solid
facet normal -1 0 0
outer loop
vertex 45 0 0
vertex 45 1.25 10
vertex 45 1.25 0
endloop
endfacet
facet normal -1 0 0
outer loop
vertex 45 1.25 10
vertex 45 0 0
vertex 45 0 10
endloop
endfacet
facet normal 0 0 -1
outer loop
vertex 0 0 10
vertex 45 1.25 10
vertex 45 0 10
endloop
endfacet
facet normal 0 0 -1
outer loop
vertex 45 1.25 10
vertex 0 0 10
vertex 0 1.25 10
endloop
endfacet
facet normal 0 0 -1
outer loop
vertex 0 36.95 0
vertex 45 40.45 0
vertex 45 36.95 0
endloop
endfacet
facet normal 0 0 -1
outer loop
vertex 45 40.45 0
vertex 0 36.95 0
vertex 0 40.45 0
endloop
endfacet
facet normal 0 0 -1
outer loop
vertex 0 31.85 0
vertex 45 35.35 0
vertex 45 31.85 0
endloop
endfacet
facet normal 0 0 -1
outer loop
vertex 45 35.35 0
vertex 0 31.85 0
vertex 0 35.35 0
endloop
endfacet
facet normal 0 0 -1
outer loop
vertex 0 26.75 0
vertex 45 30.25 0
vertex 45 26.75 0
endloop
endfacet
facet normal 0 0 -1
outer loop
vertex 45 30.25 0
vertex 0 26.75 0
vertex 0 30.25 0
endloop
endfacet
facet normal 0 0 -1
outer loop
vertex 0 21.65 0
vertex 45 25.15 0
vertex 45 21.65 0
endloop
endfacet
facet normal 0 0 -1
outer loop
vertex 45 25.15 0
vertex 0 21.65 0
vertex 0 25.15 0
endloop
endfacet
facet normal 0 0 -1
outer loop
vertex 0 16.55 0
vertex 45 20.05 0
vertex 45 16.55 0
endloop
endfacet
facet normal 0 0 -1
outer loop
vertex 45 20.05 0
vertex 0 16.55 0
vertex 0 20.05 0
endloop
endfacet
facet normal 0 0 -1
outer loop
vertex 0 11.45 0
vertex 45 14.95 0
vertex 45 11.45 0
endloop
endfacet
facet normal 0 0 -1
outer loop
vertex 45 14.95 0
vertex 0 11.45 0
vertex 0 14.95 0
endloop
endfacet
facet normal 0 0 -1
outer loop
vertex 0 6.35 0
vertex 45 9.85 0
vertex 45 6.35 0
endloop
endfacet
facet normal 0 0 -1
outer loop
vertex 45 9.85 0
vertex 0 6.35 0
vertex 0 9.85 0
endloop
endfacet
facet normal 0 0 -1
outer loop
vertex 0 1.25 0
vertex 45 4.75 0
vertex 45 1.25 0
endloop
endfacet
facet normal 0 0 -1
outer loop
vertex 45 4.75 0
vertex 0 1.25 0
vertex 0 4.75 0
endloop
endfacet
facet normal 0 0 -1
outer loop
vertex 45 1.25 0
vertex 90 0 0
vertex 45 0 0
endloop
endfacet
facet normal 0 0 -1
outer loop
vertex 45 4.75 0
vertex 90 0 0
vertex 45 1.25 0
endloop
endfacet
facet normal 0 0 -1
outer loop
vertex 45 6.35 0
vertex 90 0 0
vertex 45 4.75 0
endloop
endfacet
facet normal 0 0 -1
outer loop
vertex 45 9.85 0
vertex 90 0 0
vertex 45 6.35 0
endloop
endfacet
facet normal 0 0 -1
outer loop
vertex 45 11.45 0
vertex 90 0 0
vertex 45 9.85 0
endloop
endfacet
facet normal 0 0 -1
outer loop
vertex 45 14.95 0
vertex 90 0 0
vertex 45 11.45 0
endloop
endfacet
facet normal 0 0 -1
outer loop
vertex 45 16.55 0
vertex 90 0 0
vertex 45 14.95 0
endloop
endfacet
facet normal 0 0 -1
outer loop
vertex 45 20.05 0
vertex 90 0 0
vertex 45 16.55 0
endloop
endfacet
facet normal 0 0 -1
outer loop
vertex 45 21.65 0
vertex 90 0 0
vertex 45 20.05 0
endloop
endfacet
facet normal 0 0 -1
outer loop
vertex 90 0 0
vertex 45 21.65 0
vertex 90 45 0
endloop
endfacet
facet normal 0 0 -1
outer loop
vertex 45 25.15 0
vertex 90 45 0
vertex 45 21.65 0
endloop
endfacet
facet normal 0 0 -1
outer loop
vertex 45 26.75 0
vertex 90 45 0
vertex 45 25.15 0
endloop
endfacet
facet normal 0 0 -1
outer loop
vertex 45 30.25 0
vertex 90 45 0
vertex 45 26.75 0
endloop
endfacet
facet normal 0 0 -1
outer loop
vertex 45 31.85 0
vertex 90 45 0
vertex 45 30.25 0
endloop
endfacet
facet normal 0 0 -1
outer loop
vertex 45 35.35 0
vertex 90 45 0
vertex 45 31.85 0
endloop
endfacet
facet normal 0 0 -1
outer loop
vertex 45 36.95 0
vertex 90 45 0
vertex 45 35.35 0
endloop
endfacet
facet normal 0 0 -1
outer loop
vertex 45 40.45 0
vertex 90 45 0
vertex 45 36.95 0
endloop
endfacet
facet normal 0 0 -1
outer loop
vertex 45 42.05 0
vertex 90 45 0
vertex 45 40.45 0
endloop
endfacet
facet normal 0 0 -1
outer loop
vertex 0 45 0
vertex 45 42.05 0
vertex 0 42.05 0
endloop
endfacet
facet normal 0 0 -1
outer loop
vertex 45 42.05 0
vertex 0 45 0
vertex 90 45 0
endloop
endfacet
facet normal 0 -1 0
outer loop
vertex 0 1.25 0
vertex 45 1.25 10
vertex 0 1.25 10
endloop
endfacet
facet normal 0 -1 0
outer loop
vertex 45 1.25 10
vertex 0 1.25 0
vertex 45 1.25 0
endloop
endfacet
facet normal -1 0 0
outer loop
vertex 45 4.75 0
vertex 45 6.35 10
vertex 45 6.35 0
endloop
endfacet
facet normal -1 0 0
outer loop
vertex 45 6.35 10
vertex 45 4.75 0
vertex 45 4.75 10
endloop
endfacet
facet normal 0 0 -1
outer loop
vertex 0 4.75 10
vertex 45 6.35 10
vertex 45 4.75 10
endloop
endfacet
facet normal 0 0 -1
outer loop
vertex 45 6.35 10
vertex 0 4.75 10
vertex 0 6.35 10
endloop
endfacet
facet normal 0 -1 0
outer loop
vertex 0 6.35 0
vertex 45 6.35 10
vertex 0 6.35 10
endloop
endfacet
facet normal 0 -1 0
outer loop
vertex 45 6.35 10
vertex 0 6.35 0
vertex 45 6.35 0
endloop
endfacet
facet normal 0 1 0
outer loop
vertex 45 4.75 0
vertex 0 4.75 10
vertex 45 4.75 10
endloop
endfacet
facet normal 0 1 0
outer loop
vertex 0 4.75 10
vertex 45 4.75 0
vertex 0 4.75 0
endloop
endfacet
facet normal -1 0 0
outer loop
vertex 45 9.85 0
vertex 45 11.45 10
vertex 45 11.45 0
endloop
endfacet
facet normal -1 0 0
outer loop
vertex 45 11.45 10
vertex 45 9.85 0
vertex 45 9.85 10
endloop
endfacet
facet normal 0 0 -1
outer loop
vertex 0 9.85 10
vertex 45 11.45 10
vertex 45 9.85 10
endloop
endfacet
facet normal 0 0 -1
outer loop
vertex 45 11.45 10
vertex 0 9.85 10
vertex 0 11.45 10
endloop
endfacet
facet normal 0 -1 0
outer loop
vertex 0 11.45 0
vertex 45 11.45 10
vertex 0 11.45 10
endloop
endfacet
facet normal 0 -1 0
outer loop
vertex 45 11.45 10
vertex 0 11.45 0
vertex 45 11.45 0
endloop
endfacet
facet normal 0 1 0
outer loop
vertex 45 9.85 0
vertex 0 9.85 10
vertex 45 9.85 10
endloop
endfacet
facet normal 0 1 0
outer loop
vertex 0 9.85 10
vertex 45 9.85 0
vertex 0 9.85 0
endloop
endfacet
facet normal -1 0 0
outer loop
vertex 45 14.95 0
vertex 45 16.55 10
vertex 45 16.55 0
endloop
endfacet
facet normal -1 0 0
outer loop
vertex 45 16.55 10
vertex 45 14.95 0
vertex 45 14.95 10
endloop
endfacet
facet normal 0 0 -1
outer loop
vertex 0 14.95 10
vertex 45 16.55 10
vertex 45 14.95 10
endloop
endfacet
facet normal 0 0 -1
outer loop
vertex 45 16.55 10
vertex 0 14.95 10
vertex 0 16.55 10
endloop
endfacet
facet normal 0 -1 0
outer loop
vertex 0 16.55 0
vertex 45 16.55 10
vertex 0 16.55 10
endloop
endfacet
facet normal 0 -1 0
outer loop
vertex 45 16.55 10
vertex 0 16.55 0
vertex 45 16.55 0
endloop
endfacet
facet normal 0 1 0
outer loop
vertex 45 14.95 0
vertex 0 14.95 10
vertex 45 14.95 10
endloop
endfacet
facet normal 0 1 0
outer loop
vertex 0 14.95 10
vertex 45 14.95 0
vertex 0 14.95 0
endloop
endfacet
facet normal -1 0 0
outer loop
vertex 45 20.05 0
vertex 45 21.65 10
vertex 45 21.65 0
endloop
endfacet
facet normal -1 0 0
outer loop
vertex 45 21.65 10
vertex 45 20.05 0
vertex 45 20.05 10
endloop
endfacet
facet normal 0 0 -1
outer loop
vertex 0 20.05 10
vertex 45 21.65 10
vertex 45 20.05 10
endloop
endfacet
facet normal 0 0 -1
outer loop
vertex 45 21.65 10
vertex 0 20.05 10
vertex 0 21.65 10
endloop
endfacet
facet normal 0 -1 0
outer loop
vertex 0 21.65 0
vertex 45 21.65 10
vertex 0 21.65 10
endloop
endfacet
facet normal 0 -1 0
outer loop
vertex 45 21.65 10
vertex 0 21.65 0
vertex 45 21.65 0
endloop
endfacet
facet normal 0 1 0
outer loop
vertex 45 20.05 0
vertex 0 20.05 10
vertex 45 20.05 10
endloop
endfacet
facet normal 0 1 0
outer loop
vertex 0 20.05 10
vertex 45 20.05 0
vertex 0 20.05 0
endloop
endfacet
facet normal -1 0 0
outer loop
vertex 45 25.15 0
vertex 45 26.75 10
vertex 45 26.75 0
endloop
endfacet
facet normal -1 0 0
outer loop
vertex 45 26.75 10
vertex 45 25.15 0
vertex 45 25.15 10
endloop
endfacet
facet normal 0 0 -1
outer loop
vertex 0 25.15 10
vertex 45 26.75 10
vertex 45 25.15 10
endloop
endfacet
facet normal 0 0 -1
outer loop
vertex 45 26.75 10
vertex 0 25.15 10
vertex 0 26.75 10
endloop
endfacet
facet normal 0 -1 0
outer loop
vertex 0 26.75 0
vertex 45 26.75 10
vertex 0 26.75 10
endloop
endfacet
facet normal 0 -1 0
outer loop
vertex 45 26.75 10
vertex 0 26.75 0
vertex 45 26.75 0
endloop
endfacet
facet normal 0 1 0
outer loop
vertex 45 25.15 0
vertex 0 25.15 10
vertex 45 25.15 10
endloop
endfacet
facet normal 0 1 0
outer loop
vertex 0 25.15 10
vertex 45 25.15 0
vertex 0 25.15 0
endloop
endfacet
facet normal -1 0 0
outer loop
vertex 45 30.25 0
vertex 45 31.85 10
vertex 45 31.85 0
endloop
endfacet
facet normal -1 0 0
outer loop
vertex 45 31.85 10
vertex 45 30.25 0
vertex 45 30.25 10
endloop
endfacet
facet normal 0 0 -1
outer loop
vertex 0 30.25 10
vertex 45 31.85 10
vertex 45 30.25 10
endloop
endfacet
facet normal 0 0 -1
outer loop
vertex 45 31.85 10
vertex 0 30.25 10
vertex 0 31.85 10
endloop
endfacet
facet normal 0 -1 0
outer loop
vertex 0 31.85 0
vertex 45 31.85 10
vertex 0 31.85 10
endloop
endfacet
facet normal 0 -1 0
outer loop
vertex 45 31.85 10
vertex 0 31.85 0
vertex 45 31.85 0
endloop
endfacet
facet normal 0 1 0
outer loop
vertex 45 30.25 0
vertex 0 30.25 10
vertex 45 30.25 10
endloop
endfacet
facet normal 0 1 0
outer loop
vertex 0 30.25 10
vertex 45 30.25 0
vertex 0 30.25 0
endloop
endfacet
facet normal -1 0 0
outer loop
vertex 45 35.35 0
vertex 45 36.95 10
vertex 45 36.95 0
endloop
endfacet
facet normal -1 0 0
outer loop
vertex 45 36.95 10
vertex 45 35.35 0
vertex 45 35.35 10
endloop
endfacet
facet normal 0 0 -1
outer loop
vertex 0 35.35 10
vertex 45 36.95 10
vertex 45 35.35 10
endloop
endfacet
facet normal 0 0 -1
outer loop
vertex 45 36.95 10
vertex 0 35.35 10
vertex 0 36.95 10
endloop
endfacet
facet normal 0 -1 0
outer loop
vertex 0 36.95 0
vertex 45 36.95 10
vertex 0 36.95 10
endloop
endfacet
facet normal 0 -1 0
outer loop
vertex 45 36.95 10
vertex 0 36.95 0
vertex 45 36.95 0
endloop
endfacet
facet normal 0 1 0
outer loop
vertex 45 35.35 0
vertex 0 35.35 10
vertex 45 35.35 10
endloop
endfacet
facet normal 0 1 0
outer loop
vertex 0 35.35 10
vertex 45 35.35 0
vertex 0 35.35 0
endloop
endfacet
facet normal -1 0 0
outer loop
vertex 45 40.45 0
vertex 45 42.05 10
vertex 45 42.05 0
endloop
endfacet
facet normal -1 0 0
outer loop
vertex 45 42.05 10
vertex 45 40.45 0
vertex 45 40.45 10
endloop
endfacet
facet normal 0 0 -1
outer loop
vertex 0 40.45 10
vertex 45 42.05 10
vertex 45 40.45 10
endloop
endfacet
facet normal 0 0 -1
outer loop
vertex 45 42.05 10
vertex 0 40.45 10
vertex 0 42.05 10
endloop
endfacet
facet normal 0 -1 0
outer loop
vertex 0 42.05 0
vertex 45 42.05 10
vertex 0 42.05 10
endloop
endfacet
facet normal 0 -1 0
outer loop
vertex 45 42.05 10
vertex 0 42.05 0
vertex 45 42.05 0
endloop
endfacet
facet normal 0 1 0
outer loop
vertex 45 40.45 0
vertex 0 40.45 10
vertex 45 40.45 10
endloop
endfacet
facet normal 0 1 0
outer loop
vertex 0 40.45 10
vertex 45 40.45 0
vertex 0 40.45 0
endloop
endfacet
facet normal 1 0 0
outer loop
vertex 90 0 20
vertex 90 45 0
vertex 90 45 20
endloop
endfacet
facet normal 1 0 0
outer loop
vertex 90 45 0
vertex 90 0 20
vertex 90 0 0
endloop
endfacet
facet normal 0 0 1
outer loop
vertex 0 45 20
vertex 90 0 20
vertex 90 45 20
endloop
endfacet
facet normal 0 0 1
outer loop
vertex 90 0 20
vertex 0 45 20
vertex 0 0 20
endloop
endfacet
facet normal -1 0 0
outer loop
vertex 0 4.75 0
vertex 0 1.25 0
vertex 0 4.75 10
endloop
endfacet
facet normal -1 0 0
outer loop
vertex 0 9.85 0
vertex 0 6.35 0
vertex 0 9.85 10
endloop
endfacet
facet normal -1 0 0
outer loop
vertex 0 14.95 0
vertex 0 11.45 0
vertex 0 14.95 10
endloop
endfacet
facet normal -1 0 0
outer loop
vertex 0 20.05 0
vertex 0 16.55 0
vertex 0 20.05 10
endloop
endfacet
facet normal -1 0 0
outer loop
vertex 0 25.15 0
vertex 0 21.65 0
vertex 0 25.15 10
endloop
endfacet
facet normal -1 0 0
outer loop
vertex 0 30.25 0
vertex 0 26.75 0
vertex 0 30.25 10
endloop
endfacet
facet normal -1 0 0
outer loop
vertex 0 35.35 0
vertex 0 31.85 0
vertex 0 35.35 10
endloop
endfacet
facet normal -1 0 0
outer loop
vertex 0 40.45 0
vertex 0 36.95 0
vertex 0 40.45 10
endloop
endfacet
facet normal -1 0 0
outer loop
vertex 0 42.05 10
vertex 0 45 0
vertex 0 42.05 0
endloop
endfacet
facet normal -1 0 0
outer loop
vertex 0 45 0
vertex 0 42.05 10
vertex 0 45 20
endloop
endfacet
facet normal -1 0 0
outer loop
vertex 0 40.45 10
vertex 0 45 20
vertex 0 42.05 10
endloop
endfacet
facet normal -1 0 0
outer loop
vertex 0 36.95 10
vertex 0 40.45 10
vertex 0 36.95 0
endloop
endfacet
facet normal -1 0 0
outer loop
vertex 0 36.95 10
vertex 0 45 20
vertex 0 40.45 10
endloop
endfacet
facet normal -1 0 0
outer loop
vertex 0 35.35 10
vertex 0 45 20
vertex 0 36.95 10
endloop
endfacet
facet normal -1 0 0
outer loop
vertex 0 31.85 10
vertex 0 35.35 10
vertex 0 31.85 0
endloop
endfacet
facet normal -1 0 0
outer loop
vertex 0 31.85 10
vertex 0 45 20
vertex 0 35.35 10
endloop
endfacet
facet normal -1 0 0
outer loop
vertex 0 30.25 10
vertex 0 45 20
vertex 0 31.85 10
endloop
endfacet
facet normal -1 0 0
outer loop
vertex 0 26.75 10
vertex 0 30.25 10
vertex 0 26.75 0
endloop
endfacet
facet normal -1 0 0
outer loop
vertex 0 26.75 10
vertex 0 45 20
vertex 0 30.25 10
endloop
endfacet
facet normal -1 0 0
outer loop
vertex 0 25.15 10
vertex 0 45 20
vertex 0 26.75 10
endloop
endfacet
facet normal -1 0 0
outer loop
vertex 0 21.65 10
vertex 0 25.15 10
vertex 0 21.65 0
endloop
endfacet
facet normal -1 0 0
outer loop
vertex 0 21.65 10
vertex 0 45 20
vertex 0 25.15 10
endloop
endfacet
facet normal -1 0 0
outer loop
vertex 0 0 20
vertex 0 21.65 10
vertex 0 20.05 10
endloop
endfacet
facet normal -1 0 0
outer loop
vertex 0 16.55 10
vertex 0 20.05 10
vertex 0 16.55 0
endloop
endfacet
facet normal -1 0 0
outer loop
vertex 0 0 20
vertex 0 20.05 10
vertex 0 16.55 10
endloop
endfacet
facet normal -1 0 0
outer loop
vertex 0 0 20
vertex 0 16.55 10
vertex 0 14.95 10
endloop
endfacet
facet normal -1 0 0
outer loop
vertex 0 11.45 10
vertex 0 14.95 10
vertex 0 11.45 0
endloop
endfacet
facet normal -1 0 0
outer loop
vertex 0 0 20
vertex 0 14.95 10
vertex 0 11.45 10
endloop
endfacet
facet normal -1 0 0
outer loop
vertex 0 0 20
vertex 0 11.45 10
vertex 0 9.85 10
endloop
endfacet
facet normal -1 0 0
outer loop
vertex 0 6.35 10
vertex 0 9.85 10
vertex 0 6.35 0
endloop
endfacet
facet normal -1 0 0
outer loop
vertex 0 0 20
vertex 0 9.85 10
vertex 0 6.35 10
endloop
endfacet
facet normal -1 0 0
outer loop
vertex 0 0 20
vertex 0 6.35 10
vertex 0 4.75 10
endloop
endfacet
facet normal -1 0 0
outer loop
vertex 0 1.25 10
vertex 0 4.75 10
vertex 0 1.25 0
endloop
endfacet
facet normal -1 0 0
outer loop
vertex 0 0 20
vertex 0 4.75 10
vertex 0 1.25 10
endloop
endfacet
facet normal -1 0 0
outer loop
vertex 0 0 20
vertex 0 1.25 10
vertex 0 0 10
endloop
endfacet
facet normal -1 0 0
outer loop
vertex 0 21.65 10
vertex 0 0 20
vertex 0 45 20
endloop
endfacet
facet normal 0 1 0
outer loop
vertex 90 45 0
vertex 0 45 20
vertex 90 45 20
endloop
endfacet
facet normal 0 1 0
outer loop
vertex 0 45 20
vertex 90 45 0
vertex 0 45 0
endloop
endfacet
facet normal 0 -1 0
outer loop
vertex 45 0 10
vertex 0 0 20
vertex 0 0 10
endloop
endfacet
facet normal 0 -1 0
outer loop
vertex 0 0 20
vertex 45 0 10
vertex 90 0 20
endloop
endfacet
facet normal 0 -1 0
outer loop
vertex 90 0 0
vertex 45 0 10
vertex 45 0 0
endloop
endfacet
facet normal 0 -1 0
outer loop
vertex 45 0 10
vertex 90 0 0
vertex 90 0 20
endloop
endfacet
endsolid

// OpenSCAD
// Slide drying rack - a solid base block with a row of parallel slots standing up on their long
// edge, for drying 10 x 75 mm microscope slides. NOVEL general part.
//

slides = 10;
base_l = 90;
base_w = 45;
base_h = 20;
slot_l = 77;
slot_w = 1.6;
slot_d = 10;
pitch   = 3.5;

$fn = 48;

slot_x = (base_l - 2 * slot_l) / 2;
pitch_w = slot_w + pitch;
start_y = (base_w - slot_d - pitch_w * (slides - 1)) / 2;

difference() {
    translate([0, 0, 0]) cube([base_l, base_w, base_h]);
    for (i = [0 : slides - 1])
        translate([slot_x, start_y + i * pitch_w, 0]) cube([slot_l, slot_w, slot_d]);
}
